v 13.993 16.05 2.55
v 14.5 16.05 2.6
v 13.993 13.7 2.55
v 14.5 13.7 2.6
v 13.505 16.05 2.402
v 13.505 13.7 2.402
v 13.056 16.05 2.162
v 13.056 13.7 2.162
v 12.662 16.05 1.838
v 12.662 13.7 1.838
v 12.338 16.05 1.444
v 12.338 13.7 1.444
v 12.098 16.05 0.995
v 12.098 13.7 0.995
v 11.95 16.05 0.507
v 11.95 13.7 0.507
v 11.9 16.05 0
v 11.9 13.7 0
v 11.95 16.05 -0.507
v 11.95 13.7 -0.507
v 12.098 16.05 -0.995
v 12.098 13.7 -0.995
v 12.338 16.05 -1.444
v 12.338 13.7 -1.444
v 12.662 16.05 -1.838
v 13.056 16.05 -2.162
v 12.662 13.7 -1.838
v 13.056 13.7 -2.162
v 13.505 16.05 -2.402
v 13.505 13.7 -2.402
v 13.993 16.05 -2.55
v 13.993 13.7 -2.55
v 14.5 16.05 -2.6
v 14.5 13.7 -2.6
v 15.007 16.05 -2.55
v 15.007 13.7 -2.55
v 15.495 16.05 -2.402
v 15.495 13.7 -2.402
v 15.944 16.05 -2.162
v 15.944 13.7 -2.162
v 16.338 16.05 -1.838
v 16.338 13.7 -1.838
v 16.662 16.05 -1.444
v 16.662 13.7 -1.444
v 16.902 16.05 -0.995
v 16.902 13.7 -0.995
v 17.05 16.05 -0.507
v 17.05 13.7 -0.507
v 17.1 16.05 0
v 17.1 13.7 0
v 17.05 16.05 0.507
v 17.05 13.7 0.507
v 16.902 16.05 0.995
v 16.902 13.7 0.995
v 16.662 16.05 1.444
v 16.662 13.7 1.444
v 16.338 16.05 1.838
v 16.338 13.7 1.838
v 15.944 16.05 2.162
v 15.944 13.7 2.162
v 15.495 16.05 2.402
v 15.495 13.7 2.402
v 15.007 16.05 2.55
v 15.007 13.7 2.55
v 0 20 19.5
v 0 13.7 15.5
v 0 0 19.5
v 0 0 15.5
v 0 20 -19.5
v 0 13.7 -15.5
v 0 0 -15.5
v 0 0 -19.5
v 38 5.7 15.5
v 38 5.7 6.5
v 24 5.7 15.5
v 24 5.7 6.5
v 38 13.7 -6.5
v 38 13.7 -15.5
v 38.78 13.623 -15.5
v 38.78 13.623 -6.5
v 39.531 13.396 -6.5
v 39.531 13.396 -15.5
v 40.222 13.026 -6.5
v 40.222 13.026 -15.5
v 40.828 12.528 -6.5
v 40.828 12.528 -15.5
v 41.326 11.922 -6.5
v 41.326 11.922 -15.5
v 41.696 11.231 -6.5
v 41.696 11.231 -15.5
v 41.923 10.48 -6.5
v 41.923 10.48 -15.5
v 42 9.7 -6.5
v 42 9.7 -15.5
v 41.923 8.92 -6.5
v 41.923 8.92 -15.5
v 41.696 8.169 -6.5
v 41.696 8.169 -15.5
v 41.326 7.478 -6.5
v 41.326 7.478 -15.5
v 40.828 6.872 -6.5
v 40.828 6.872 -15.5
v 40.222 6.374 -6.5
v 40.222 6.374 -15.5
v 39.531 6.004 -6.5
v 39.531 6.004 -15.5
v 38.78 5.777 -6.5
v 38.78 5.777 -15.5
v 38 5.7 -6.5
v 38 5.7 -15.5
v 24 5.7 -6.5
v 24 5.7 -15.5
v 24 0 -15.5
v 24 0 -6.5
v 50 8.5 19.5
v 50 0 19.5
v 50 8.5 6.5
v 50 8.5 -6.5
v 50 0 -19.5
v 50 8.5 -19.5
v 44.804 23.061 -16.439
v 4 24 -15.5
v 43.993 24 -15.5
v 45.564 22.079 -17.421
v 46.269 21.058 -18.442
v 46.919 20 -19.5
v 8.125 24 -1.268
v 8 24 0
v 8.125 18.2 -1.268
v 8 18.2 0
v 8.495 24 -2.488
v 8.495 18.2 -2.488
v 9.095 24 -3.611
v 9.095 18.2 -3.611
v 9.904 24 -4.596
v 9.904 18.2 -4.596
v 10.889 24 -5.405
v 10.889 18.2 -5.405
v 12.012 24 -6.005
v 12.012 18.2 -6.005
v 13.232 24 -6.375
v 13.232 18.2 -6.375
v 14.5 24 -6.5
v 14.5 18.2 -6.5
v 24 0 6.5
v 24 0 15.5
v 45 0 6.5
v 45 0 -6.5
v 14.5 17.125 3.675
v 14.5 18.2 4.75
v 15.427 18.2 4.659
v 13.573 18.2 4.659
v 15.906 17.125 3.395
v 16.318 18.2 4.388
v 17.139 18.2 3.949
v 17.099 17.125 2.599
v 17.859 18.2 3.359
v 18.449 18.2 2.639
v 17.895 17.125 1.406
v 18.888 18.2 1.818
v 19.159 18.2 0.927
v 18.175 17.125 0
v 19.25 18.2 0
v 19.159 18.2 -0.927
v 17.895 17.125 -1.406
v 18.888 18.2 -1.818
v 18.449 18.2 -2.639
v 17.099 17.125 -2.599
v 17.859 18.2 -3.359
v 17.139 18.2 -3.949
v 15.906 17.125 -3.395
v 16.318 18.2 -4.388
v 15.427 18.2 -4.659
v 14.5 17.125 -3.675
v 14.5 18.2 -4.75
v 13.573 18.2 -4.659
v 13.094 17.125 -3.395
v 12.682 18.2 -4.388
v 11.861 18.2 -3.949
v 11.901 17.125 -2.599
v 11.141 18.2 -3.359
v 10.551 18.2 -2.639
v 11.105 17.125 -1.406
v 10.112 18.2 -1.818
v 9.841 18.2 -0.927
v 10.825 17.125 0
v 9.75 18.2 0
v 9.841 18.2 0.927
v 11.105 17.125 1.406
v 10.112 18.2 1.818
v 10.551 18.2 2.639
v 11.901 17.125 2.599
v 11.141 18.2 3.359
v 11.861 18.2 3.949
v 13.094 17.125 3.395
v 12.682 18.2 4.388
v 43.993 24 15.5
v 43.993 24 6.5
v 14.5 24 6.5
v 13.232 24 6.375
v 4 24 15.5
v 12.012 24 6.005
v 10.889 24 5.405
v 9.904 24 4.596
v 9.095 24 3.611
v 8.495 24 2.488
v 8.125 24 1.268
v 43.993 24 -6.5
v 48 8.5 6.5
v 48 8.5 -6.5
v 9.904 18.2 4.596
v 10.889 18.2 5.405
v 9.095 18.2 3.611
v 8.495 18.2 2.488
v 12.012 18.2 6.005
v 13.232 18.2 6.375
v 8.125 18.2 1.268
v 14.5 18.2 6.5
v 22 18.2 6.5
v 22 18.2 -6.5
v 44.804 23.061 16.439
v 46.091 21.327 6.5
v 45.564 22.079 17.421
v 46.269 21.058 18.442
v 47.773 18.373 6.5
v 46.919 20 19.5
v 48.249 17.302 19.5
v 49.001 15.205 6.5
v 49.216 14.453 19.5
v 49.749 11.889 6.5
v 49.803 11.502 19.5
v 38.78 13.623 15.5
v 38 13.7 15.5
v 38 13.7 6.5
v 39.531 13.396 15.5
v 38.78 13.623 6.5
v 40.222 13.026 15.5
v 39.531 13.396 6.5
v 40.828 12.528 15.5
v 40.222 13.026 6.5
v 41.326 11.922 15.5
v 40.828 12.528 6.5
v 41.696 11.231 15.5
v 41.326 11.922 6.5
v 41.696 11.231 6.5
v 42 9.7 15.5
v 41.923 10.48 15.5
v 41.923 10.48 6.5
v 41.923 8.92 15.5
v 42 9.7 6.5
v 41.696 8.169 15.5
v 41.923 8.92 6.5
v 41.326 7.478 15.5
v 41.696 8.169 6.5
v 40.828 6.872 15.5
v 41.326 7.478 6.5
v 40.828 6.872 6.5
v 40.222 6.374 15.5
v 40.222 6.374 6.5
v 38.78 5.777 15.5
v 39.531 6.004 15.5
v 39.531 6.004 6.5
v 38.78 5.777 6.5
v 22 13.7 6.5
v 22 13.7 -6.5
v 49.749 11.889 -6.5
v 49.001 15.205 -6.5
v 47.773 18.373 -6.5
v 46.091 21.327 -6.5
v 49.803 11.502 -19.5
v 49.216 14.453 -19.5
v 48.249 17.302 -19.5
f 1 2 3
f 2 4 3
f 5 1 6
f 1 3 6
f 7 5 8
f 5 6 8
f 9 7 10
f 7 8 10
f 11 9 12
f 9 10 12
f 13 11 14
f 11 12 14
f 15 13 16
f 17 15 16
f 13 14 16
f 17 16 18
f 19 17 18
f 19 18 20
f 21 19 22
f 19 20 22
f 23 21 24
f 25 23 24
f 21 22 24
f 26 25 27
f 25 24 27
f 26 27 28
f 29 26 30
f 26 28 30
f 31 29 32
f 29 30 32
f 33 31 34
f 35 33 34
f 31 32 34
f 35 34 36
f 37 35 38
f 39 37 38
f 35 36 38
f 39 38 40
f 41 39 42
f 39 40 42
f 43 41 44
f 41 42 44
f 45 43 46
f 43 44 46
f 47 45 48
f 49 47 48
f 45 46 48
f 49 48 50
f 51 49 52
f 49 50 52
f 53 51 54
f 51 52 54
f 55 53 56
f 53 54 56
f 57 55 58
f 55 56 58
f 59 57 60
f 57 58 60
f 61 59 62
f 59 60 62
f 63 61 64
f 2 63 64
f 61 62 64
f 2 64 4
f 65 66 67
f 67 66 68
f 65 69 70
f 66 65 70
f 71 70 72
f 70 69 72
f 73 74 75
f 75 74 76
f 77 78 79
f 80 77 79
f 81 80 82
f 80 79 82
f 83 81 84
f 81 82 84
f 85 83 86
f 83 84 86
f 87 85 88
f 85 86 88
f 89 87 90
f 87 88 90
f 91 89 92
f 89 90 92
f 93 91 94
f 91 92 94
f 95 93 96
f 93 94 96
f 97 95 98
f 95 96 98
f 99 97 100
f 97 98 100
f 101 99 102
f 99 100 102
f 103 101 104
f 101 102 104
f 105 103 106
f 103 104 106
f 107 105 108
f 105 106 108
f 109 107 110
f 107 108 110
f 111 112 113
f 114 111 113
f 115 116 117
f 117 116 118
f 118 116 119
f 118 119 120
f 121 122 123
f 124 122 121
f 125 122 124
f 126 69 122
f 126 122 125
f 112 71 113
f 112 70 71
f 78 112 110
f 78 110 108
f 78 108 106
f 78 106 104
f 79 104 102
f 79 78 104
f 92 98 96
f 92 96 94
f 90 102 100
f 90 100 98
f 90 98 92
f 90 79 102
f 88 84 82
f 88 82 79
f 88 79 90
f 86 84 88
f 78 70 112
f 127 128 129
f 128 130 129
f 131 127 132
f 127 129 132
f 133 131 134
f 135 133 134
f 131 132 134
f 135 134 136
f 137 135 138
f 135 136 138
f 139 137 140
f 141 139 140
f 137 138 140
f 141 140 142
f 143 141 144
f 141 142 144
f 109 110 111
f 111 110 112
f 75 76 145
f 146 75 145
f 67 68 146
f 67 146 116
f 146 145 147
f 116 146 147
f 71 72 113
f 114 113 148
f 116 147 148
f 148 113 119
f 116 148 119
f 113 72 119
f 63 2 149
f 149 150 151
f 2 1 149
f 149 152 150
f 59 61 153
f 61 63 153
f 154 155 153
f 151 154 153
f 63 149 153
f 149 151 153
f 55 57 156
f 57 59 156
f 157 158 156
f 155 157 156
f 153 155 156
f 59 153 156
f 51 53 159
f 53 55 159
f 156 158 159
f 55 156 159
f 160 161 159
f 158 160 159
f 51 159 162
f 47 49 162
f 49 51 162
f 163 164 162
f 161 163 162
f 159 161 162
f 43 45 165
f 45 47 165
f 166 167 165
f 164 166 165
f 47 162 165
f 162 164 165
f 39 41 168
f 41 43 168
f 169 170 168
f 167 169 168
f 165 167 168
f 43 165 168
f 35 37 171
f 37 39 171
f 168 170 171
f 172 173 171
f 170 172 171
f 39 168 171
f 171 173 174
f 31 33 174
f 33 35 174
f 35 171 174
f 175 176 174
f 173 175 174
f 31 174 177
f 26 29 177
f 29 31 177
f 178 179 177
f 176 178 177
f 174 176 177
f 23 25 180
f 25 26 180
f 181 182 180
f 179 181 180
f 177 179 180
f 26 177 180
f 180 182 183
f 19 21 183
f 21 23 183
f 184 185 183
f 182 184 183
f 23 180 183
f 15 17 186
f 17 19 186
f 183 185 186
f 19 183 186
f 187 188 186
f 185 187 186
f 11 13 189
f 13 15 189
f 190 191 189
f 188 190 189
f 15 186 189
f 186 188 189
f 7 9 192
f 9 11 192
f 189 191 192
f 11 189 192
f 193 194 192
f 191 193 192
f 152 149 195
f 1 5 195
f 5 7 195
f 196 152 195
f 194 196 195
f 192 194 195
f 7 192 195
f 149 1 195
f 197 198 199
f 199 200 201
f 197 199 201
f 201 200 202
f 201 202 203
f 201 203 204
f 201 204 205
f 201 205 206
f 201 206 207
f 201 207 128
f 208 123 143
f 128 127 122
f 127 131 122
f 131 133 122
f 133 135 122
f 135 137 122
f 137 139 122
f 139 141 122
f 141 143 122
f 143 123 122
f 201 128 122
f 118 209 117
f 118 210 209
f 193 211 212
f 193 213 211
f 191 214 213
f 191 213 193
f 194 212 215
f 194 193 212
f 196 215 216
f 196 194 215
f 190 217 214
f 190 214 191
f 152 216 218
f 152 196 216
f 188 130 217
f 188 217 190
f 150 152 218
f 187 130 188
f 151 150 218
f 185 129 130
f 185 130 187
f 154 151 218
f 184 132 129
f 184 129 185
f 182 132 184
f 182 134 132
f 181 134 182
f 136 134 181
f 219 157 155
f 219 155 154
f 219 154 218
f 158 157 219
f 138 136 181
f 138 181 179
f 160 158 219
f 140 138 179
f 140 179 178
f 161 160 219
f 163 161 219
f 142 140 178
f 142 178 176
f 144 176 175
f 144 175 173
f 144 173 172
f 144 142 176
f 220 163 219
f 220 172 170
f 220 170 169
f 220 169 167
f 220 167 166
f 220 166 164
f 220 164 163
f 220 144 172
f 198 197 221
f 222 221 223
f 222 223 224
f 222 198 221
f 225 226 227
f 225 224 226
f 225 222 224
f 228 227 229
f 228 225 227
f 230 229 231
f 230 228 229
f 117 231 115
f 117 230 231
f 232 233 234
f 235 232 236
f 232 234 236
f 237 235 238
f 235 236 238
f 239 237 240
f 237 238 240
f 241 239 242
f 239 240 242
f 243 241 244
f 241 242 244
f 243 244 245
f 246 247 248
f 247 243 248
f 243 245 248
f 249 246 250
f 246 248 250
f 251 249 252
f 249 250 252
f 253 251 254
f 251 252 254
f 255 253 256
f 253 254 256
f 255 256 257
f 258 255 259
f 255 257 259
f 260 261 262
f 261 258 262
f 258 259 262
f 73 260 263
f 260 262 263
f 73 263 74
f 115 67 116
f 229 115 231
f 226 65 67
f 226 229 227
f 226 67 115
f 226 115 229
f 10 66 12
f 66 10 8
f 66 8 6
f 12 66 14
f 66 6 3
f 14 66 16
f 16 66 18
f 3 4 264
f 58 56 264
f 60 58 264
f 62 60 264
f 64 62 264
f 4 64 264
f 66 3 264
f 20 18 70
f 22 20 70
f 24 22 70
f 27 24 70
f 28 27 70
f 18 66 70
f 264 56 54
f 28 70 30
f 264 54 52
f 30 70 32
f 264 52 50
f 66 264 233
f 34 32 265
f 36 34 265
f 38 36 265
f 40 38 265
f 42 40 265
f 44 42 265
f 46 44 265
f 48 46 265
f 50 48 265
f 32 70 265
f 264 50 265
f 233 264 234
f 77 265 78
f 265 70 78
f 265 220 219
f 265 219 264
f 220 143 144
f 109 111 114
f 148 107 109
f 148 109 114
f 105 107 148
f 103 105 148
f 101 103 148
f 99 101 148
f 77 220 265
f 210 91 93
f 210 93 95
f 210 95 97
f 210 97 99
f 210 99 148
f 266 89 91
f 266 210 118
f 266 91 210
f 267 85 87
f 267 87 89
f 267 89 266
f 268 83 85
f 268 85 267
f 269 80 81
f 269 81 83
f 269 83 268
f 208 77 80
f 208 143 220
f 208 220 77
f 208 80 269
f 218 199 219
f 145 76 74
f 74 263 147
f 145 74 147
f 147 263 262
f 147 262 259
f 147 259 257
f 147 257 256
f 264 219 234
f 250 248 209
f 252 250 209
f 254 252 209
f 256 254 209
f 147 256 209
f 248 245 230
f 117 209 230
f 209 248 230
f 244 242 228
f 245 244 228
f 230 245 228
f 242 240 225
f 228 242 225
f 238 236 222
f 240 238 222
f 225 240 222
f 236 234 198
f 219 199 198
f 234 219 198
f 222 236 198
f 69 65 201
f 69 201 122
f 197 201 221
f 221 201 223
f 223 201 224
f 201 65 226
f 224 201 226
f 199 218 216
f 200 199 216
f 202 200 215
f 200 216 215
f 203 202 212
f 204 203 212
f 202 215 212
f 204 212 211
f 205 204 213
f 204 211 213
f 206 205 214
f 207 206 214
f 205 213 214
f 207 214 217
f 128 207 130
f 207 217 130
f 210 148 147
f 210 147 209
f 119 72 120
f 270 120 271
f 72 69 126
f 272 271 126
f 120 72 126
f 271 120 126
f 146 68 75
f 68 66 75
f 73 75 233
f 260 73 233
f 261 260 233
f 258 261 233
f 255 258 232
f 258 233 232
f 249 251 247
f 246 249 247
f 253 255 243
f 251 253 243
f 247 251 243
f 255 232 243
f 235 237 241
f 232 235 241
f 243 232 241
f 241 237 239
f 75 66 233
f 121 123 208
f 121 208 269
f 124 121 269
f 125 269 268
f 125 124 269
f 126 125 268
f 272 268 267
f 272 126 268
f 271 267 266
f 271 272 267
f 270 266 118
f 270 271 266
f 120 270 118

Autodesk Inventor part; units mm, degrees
ref_plane "YZ Plane" through (0, 0, 0) normal (1, 0, 0) x (0, 1, 0)
ref_plane "XZ Plane" through (0, 0, 0) normal (0, 1, 0) x (-1, 0, 0)
ref_plane "XY Plane" through (0, 0, 0) normal (0, 0, 1) x (1, 0, 0)
sketch "Sketch1" plane through (0, 0, 0) normal (0, 0, 1) x (1, 0, 0)
  line L0 (0, 0) -> (50, 0)
  line L1 (50, 0) -> (50, 8.5)
  arc A0 (50, 8.5) -> (43.9926, 24) centre (27, 8.5) ccw
  line L2 (43.9926, 24) -> (0, 24)
  line L3 (0, 24) -> (0, 0)
  dimension "d3" = 50
  dimension "d4" = 24
  dimension "d5" = 23
  dimension "d6" = 8.5
extrude "Extrusion1" add sketch "Sketch1" along normal mid plane 39
sketch "Sketch2" plane through (0, 0, 0) normal (0, 0, 1) x (1, 0, 0)
  line L0 (0, 0) -> (0, 24) projected
  line L1 (0, 13.7) -> (38, 13.7)
  arc A0 (38, 5.7) -> (38, 13.7) centre (38, 9.7) ccw
  line L2 (38, 5.7) -> (24, 5.7)
  line L3 (24, 5.7) -> (24, 0)
  line L4 (50, 0) -> (0, 0) projected
  line L5 (24, 0) -> (0, 0)
  line L6 (0, 0) -> (0, 13.7)
  dimension "d9" = 5.7
  dimension "d10" = 26
  dimension "d11" = 4
  dimension "d12" = 38
extrude "Extrusion2" cut sketch "Sketch2" along normal mid plane 31
sketch "Sketch3" plane through (0, 0, 0) normal (0, 0, 1) x (1, 0, 0)
  line L0 (0, 24) -> (43.9926, 24) projected
  line L1 (8, 24) -> (8, 18.2)
  line L2 (8, 18.2) -> (22, 18.2)
  line L3 (22, 18.2) -> (22, 0)
  line L4 (50, 0) -> (0, 0) projected
  line L5 (45, 0) -> (48, 8.5)
  line L6 (48, 8.5) -> (50, 8.5)
  line L7 (50, 8.5) -> (50, 0) projected
  line L8 (50, 24) -> (50, 8.5)
  line L9 (8, 24) -> (50, 24)
  line L10 (0, 13.7) -> (38, 13.7) projected
  dimension "d15" = 4.5
  dimension "d16" = 5
  dimension "d17" = 2
  dimension "d19" = 8.5
  dimension "d20" = 42
  dimension "d31" = 28
extrude "Extrusion3" cut sketch "Sketch3" along normal mid plane 13 contours L0 L9 L8 L6 L5 L4 L3 L2 L1
fillet "Fillet1" radius 6.5 2 edges at (8, 21.1, 6.5) (8, 21.1, -6.5)
sketch "Sketch4" plane through (22, 18.2, 6.5) normal (0, 1, 0) x (1, 0, 0)
  arc A0 (-7.5, 13) -> (-7.5, 0) centre (-7.5, 6.5) ccw projected
  point P0 (-22, 6.5)
hole "Hole1" at (14.5, 18.2, 0) direction (0, -1, 0) diameter 5.2 end through all countersink diameter 9.5 countersink angle 90
chamfer "Chamfer1" distance 4 angle 45 3 edges at (0, 24, 0) (21.9963, 24, -19.5) (21.9963, 24, 19.5)
properties material "Steel, Carbon"
